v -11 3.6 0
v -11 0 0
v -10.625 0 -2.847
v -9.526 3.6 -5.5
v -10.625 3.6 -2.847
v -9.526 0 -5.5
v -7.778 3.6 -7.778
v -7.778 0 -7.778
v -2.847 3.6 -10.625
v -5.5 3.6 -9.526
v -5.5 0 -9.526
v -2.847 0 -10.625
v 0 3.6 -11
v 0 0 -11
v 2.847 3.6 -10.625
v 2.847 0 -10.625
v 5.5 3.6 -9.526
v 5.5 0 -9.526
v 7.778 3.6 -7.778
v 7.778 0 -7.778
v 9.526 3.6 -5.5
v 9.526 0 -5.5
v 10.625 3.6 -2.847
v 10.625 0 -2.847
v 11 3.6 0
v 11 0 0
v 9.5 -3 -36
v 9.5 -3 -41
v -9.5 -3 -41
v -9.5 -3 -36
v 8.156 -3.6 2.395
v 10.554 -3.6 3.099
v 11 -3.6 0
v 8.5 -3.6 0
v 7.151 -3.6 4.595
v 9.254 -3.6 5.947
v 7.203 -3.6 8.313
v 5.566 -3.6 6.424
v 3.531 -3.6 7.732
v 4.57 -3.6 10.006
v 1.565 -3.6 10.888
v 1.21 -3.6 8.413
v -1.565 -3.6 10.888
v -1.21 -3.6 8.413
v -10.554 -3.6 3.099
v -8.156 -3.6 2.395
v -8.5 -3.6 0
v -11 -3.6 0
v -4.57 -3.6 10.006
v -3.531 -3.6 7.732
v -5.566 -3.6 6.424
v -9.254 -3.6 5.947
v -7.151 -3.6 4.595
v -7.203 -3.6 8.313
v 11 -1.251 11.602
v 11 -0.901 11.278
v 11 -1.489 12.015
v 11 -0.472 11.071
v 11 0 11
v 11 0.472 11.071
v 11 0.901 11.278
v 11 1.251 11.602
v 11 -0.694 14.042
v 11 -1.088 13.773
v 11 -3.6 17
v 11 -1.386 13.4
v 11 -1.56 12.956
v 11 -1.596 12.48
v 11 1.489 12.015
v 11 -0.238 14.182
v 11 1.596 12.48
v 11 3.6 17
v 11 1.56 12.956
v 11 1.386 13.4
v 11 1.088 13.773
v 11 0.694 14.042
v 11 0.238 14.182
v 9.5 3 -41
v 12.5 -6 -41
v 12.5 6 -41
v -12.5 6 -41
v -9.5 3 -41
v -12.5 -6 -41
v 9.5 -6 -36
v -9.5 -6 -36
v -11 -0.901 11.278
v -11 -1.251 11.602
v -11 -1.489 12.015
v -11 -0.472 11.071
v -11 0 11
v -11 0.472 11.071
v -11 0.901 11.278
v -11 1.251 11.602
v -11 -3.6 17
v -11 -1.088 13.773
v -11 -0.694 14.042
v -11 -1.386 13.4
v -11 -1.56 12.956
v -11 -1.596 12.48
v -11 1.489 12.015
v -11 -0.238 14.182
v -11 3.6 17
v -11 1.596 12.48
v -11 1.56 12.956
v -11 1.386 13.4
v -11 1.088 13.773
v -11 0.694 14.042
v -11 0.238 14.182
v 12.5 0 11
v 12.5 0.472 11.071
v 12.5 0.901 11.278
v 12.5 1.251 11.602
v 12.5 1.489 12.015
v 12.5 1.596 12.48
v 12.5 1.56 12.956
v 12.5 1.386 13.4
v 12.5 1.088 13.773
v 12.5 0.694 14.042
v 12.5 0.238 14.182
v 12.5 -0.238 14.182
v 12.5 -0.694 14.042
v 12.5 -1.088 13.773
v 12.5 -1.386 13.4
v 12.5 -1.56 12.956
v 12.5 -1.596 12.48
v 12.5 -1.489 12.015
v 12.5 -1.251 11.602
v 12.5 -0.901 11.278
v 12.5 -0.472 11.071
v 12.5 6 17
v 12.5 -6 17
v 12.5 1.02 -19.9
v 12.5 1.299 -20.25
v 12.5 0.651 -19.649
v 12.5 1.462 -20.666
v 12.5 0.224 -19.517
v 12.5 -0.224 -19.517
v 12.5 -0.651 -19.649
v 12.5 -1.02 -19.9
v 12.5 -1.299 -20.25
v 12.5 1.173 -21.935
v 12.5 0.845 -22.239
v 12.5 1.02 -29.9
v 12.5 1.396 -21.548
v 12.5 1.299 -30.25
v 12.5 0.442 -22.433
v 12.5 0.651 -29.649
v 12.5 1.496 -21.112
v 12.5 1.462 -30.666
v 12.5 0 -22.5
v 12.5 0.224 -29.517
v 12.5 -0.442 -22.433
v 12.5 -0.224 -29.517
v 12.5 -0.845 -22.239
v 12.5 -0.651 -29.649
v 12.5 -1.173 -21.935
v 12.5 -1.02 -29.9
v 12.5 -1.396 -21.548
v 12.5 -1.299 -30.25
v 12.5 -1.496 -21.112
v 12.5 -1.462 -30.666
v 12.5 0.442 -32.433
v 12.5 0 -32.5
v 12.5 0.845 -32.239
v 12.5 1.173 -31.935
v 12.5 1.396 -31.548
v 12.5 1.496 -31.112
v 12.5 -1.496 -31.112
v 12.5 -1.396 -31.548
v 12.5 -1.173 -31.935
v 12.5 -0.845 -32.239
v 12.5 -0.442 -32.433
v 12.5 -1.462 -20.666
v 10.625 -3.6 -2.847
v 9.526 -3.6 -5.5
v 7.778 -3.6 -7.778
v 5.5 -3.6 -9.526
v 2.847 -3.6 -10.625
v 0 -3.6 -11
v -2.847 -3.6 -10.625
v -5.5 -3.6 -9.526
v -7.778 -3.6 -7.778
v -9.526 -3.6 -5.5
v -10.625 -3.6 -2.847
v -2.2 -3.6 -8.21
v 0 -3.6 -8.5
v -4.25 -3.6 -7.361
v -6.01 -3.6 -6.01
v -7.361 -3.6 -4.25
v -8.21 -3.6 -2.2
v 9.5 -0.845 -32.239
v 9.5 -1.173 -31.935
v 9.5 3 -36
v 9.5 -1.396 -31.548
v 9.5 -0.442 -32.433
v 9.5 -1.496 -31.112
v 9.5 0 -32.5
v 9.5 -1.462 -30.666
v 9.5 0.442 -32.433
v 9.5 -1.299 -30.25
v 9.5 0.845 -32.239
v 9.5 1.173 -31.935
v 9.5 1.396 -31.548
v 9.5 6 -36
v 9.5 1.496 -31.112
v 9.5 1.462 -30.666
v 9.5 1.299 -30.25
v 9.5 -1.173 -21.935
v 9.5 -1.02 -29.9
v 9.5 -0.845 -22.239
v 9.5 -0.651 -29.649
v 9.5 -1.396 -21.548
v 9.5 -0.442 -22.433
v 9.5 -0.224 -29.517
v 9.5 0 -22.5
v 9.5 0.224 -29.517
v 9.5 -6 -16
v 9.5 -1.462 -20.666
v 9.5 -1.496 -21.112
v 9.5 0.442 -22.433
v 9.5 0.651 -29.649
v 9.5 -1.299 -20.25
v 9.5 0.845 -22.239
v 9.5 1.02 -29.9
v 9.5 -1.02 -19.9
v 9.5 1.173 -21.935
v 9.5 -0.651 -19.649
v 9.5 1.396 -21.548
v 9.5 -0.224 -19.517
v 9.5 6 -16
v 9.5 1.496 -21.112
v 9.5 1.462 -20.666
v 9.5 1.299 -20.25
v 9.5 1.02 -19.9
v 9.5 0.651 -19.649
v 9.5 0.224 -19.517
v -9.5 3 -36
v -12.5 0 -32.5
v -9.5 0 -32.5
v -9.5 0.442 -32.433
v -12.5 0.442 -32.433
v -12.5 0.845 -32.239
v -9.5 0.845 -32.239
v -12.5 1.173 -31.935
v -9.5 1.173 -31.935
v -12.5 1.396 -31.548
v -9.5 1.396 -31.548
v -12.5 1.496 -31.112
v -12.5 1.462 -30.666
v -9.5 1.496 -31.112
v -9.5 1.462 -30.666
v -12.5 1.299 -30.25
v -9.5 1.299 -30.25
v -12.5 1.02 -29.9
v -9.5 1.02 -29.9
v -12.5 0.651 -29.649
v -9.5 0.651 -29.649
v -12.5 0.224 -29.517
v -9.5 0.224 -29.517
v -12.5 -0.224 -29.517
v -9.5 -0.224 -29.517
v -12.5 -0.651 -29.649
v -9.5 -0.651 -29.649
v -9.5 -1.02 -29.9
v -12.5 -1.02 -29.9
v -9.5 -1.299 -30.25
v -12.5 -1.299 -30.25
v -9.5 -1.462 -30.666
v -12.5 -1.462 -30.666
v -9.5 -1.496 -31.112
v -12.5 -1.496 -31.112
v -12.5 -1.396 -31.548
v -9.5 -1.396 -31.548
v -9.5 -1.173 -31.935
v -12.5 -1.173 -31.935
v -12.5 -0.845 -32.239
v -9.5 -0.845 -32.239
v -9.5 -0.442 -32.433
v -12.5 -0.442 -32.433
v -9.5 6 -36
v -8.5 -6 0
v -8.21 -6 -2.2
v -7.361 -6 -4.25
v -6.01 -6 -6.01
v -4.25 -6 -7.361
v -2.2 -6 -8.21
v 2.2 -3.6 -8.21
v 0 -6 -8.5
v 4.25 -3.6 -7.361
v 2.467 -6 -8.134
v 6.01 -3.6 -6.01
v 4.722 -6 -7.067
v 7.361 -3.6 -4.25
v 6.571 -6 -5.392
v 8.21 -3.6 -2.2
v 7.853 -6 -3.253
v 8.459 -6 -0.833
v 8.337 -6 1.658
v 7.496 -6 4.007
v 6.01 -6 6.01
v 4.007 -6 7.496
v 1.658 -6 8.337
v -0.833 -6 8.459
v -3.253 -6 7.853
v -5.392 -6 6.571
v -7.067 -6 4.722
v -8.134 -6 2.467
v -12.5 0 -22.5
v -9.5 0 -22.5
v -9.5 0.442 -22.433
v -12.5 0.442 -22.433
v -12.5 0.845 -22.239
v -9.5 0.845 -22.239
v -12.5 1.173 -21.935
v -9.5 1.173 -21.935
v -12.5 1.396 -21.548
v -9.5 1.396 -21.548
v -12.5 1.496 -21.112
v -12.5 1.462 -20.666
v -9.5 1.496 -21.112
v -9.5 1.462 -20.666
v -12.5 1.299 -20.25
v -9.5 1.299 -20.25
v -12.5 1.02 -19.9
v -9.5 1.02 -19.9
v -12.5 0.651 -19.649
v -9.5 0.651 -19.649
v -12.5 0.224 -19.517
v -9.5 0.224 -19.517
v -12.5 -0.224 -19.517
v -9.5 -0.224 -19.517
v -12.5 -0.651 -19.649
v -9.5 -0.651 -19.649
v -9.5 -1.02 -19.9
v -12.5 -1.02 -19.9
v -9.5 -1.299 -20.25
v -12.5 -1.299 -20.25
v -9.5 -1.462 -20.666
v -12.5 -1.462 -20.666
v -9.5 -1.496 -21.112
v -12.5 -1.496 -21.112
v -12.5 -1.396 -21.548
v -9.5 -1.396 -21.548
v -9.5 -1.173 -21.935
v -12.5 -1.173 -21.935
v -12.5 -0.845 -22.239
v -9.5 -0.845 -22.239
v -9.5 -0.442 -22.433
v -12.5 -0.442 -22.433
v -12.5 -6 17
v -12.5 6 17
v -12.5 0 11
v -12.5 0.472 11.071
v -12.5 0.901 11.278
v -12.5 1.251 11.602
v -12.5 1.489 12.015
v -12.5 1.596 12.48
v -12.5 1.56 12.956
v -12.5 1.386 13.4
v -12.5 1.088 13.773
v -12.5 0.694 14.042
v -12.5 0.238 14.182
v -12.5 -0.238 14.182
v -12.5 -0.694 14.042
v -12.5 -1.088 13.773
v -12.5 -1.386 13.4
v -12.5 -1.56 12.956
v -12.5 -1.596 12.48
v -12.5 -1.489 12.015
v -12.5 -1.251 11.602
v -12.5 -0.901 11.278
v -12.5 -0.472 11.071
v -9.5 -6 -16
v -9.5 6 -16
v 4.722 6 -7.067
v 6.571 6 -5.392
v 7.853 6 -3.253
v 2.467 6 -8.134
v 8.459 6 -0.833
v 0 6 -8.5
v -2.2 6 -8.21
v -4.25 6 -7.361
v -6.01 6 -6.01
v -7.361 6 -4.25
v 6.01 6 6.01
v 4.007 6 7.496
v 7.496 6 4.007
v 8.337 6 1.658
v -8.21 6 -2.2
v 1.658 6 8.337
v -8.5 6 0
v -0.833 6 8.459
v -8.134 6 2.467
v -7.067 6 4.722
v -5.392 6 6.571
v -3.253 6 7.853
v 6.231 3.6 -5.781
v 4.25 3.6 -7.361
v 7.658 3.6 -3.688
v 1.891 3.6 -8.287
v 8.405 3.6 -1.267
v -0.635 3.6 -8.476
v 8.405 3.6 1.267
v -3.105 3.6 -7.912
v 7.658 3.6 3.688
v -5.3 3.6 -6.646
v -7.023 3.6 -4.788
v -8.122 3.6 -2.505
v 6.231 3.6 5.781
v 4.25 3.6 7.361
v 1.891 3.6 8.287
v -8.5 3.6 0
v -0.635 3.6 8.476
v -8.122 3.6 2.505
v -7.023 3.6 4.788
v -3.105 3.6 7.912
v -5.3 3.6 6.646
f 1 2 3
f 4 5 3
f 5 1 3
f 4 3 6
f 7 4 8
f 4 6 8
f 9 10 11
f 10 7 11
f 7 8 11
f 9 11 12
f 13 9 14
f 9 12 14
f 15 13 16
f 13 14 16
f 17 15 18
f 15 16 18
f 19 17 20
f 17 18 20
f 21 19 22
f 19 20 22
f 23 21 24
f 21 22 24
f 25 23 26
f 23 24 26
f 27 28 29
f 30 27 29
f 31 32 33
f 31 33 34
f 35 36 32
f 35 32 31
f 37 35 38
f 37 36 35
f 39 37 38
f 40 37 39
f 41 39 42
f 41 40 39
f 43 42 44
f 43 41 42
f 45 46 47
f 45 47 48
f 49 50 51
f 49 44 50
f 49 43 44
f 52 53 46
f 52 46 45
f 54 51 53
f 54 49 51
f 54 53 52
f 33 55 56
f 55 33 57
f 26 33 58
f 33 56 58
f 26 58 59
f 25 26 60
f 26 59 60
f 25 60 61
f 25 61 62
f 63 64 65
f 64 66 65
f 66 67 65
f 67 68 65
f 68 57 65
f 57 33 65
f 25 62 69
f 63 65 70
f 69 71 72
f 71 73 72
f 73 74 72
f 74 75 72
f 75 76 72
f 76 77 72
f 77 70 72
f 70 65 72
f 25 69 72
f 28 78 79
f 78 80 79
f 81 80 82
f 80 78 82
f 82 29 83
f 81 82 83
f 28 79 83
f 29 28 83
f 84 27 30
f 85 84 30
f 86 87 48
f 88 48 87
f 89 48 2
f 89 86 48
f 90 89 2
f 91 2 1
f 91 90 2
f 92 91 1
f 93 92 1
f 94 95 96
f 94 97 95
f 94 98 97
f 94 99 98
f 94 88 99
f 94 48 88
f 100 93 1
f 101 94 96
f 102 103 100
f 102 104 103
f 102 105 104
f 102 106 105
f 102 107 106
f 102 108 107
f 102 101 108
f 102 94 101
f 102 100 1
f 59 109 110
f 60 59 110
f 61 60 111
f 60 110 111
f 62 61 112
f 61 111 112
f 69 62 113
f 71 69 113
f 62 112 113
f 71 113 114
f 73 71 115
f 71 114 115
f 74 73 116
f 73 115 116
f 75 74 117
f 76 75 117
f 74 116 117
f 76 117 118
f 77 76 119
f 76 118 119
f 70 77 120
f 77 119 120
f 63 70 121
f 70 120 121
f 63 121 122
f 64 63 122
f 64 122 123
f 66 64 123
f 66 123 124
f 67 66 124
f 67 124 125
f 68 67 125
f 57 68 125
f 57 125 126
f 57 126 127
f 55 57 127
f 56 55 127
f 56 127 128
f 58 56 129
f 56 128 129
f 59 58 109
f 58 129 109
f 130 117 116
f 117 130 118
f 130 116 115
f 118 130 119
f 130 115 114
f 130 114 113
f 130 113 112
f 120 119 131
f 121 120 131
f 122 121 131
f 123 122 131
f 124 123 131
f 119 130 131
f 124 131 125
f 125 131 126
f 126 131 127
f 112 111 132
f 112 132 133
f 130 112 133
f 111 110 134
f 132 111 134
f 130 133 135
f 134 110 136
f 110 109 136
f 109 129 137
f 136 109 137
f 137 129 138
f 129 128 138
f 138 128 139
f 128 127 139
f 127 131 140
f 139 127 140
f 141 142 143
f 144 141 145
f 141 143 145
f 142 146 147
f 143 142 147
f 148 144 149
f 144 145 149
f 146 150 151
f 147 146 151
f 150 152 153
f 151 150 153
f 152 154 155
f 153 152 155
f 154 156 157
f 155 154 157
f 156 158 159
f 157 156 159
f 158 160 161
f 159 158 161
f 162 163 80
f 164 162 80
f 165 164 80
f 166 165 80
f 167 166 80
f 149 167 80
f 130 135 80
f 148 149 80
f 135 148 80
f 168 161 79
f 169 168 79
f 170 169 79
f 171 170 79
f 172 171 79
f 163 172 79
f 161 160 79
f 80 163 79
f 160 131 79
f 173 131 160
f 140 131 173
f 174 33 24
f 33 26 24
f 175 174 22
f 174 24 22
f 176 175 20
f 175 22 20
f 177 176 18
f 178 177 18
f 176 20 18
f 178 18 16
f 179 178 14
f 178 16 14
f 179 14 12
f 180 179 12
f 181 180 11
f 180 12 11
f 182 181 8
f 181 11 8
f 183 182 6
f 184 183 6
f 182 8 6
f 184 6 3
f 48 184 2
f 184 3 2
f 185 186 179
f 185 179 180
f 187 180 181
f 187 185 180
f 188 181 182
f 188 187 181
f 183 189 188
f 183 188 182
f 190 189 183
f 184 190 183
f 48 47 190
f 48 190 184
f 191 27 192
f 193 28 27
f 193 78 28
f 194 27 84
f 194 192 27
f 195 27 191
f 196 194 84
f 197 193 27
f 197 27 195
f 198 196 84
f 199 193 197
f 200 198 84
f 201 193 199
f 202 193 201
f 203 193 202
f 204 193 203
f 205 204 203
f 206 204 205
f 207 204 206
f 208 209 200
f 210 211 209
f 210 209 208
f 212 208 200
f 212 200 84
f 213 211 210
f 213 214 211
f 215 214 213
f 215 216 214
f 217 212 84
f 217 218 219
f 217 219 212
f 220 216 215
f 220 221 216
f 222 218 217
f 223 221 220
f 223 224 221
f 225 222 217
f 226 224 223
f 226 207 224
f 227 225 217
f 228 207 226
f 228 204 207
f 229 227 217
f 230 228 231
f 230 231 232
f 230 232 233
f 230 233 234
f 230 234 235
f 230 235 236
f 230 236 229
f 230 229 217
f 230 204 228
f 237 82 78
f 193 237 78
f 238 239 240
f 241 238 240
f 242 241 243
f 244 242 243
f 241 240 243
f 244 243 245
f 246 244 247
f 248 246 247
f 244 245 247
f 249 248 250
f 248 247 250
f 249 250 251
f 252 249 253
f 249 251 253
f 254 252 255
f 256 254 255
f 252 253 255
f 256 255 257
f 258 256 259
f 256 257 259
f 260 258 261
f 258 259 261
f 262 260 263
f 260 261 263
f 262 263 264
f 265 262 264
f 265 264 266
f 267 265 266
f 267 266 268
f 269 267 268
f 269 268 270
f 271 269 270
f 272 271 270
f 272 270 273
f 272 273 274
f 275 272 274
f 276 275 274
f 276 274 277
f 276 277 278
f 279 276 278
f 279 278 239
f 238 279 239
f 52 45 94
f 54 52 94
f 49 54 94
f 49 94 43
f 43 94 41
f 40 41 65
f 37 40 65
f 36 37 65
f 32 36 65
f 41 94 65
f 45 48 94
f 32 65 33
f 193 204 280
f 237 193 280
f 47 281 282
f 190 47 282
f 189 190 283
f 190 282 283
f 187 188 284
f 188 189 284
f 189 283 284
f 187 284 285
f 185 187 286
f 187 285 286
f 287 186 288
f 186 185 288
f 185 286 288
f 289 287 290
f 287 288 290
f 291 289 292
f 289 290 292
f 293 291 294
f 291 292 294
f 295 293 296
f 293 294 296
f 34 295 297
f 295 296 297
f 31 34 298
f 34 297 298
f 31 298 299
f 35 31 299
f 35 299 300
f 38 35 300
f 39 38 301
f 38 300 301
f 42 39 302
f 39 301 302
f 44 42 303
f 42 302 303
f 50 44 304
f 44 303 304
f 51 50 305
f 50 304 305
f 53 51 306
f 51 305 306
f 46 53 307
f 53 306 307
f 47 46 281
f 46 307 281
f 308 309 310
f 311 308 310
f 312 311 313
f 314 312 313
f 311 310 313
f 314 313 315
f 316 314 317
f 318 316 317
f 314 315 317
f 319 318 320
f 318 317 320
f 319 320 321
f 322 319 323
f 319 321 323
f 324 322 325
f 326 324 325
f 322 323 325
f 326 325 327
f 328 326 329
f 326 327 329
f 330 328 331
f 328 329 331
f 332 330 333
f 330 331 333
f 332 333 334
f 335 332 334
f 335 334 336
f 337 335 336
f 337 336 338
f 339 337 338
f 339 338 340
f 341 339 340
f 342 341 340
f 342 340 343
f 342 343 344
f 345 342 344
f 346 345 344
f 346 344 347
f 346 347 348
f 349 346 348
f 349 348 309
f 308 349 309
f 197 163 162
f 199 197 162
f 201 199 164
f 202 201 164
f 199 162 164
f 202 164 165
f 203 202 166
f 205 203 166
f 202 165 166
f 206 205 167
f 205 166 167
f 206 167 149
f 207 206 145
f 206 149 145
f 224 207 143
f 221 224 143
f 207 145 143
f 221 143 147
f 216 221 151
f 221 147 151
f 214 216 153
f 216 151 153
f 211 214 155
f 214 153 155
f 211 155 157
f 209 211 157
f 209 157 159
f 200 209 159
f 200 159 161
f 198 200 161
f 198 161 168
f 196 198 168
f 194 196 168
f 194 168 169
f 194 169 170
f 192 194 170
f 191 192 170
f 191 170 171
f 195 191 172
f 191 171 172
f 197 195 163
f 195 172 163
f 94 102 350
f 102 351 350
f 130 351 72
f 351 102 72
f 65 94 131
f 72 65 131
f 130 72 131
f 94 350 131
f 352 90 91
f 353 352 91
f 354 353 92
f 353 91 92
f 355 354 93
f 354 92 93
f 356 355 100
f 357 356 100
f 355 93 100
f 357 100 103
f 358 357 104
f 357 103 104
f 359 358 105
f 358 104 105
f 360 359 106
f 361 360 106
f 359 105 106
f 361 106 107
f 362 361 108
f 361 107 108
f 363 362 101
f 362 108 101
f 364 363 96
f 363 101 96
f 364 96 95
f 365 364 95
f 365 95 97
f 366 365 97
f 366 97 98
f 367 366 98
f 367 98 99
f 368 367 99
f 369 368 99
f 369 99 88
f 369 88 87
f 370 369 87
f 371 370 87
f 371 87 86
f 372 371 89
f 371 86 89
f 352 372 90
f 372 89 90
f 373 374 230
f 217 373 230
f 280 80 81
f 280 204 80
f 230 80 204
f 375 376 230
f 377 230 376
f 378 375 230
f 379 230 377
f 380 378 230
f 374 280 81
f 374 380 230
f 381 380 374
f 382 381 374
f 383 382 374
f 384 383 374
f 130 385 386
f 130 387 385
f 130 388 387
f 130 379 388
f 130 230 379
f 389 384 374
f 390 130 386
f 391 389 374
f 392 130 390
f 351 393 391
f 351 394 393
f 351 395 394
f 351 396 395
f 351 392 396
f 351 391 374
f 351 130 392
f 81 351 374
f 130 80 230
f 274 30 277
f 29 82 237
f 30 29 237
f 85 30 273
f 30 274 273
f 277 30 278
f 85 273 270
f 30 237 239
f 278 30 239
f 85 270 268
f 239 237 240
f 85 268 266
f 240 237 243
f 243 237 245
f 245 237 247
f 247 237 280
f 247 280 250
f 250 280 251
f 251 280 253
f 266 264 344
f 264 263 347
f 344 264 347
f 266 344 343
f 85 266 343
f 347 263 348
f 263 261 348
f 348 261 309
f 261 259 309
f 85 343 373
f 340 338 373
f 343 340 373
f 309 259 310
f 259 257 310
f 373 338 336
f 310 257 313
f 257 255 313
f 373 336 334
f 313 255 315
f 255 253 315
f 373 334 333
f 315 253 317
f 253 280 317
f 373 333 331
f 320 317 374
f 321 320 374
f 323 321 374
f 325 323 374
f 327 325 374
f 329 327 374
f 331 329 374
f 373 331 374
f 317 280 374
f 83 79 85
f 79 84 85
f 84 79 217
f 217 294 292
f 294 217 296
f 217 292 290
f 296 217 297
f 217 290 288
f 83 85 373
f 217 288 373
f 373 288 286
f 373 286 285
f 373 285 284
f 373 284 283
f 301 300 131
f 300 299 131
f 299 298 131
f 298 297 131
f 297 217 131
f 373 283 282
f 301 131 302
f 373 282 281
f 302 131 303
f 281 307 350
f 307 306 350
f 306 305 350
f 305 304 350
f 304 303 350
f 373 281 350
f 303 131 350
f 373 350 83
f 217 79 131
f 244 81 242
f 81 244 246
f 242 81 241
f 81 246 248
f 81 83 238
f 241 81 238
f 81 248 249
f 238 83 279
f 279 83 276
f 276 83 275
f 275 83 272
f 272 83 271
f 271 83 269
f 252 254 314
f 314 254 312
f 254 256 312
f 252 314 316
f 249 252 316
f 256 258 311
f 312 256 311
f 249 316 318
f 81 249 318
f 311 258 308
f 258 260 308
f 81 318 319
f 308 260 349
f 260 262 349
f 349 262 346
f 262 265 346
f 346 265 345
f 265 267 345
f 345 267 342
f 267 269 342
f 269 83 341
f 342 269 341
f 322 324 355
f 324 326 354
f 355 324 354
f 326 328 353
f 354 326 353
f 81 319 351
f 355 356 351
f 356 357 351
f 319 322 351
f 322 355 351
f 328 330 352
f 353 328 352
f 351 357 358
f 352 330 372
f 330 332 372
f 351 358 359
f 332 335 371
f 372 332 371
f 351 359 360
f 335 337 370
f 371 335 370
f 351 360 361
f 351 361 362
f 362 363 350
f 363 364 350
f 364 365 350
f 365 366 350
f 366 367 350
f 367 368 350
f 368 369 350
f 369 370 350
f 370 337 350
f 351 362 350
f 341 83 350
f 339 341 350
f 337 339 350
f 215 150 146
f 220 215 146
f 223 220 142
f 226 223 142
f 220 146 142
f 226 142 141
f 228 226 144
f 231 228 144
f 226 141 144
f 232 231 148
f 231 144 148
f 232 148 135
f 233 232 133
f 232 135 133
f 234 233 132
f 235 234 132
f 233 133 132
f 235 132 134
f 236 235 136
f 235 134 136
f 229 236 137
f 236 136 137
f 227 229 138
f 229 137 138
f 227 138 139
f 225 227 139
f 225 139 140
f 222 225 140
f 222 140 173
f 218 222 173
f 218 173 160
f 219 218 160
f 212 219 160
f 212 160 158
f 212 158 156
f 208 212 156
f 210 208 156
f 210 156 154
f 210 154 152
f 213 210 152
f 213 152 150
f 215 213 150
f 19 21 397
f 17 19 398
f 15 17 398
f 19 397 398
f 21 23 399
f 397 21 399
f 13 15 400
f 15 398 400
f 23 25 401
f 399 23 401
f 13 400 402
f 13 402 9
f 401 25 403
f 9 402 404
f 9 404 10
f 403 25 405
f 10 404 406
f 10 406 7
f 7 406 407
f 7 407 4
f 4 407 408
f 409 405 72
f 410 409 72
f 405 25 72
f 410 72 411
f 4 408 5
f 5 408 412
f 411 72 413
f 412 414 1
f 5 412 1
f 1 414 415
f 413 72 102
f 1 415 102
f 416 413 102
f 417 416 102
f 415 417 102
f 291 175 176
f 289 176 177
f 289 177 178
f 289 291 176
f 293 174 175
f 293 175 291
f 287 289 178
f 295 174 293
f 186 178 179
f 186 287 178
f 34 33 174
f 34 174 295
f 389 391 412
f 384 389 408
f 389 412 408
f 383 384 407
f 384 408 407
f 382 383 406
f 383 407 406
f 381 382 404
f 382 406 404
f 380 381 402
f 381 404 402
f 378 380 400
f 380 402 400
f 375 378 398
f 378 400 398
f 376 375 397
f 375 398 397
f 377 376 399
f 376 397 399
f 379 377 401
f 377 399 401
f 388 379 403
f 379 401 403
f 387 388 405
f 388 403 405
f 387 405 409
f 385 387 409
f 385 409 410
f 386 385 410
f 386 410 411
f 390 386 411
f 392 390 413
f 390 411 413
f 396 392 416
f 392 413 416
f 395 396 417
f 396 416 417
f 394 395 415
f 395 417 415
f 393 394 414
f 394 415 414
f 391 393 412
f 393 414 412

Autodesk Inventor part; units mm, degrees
ref_plane "YZ Plane" through (0, 0, 0) normal (1, 0, 0) x (0, 1, 0)
ref_plane "XZ Plane" through (0, 0, 0) normal (0, 1, 0) x (-1, 0, 0)
ref_plane "XY Plane" through (0, 0, 0) normal (0, 0, 1) x (1, 0, 0)
sketch "Sketch1" plane through (0, 0, 0) normal (0, 1, 0) x (-1, 0, 0)
  circle A0 centre (0, 0) radius 11
  line L0 (0, 0) -> (0, -24.9996)
  line L1 (12.5, 17) -> (-12.5, 17)
  line L2 (-12.5, 17) -> (-12.5, -41)
  line L3 (-12.5, -41) -> (12.5, -41)
  line L4 (12.5, -41) -> (12.5, 17)
  circle A1 centre (0, 0) radius 8.5
  line L5 (0, 11) -> (9.8279, 11) construction
  line L6 (0, -11) -> (10.2574, -11) construction
  dimension "d0" = 22
  dimension "d1" = 2.5
  dimension "d2" = 25
  dimension "d3" = 6
  dimension "d4" = 30
extrude "Extrusion1" add sketch "Sketch1" along normal mid plane 12 contours A0 | L4 L3 L2 L1
extrude "Extrusion2" cut sketch "Sketch1" along normal mid plane 7.2 contours A0
sketch "Sketch2" plane through (-12.5, 6, 17) normal (0, 0, 1) x (1, 0, 0)
  line L0 (1.5, -9.6) -> (1.5, -2.4) projected
  line L1 (23.5, -9.6) -> (23.5, -2.4) projected
  line L2 (23.5, -2.4) -> (1.5, -2.4) projected
  line L3 (1.5, -9.6) -> (23.5, -9.6) projected
  point P0 (12.5, -6)
ref_plane "Work Plane1" through (0, 0, 0) normal (0, 0, 1) x (1, 0, 0)
extrude "Extrusion3" cut sketch "Sketch2" against normal up to surface (17 mm away)
ref_plane "Work Plane2" through (0, 0, 11) normal (0, 0, 1) x (1, 0, 0)
sketch "Sketch3" plane through (12.5, -6, -41) normal (1, 0, 0) x (0, 0, -1)
  line L0 (-52, -2.4) -> (-52, 14.4) construction
  circle A0 centre (-53.6, 6) radius 1.6
  point P0 (-41, 6)
  dimension "d11" = 3.2
extrude "Extrusion4" cut sketch "Sketch3" against normal through all
sketch "Sketch4" plane through (12.5, 6, -41) normal (0, 0, -1) x (-1, 0, 0)
  line L0 (22, -3) -> (3, -3)
  line L1 (3, -3) -> (3, -9)
  line L2 (3, -9) -> (22, -9)
  line L3 (22, -9) -> (22, -3)
  line L4 (0, 0) -> (25, 0) projected
  line L5 (25, -12) -> (0, -12) projected
  line L6 (25, -12) -> (25, 0) projected
  line L7 (0, -12) -> (0, 0) projected
  point P0 (12.5, -6)
  dimension "d14" = 3
  dimension "d15" = 3
  dimension "d16" = 3
  dimension "d17" = 3
extrude "Extrusion5" cut sketch "Sketch4" against normal blind 25 contours L3 L2 L1 L0
sketch "Sketch7" plane through (0, 6, 0) normal (0, 1, 0) x (1, 0, 0)
  line L0 (-9.5, 41) -> (-9.5, 16) projected
  line L1 (9.5, 41) -> (9.5, 16) projected
  line L2 (-9.5, 16) -> (9.5, 16)
  line L3 (9.5, 16) -> (9.5, 36)
  line L4 (9.5, 36) -> (-9.5, 36)
  line L5 (-9.5, 36) -> (-9.5, 16)
  line L6 (12.5, 41) -> (-12.5, 41) projected
  point P0 (0, 0)
  dimension "d20" = 5
extrude "Extrusion6" cut sketch "Sketch7" against normal through all contours L4 L1 L2 L0
sketch "Sketch8" plane through (12.5, -6, -41) normal (1, 0, 0) x (0, 0, -1)
  circle A0 centre (-10, 6) radius 1.5
  circle A1 centre (-20, 6) radius 1.5
  line L0 (0, 0) -> (0, 12) projected
  point P0 (-41, 6)
  dimension "d23" = 3
  dimension "d24" = 3
  dimension "d25" = 10
  dimension "d26" = 10
extrude "Extrusion7" cut sketch "Sketch8" against normal through all
properties part number "connecting_rod_crankschaft_side"
